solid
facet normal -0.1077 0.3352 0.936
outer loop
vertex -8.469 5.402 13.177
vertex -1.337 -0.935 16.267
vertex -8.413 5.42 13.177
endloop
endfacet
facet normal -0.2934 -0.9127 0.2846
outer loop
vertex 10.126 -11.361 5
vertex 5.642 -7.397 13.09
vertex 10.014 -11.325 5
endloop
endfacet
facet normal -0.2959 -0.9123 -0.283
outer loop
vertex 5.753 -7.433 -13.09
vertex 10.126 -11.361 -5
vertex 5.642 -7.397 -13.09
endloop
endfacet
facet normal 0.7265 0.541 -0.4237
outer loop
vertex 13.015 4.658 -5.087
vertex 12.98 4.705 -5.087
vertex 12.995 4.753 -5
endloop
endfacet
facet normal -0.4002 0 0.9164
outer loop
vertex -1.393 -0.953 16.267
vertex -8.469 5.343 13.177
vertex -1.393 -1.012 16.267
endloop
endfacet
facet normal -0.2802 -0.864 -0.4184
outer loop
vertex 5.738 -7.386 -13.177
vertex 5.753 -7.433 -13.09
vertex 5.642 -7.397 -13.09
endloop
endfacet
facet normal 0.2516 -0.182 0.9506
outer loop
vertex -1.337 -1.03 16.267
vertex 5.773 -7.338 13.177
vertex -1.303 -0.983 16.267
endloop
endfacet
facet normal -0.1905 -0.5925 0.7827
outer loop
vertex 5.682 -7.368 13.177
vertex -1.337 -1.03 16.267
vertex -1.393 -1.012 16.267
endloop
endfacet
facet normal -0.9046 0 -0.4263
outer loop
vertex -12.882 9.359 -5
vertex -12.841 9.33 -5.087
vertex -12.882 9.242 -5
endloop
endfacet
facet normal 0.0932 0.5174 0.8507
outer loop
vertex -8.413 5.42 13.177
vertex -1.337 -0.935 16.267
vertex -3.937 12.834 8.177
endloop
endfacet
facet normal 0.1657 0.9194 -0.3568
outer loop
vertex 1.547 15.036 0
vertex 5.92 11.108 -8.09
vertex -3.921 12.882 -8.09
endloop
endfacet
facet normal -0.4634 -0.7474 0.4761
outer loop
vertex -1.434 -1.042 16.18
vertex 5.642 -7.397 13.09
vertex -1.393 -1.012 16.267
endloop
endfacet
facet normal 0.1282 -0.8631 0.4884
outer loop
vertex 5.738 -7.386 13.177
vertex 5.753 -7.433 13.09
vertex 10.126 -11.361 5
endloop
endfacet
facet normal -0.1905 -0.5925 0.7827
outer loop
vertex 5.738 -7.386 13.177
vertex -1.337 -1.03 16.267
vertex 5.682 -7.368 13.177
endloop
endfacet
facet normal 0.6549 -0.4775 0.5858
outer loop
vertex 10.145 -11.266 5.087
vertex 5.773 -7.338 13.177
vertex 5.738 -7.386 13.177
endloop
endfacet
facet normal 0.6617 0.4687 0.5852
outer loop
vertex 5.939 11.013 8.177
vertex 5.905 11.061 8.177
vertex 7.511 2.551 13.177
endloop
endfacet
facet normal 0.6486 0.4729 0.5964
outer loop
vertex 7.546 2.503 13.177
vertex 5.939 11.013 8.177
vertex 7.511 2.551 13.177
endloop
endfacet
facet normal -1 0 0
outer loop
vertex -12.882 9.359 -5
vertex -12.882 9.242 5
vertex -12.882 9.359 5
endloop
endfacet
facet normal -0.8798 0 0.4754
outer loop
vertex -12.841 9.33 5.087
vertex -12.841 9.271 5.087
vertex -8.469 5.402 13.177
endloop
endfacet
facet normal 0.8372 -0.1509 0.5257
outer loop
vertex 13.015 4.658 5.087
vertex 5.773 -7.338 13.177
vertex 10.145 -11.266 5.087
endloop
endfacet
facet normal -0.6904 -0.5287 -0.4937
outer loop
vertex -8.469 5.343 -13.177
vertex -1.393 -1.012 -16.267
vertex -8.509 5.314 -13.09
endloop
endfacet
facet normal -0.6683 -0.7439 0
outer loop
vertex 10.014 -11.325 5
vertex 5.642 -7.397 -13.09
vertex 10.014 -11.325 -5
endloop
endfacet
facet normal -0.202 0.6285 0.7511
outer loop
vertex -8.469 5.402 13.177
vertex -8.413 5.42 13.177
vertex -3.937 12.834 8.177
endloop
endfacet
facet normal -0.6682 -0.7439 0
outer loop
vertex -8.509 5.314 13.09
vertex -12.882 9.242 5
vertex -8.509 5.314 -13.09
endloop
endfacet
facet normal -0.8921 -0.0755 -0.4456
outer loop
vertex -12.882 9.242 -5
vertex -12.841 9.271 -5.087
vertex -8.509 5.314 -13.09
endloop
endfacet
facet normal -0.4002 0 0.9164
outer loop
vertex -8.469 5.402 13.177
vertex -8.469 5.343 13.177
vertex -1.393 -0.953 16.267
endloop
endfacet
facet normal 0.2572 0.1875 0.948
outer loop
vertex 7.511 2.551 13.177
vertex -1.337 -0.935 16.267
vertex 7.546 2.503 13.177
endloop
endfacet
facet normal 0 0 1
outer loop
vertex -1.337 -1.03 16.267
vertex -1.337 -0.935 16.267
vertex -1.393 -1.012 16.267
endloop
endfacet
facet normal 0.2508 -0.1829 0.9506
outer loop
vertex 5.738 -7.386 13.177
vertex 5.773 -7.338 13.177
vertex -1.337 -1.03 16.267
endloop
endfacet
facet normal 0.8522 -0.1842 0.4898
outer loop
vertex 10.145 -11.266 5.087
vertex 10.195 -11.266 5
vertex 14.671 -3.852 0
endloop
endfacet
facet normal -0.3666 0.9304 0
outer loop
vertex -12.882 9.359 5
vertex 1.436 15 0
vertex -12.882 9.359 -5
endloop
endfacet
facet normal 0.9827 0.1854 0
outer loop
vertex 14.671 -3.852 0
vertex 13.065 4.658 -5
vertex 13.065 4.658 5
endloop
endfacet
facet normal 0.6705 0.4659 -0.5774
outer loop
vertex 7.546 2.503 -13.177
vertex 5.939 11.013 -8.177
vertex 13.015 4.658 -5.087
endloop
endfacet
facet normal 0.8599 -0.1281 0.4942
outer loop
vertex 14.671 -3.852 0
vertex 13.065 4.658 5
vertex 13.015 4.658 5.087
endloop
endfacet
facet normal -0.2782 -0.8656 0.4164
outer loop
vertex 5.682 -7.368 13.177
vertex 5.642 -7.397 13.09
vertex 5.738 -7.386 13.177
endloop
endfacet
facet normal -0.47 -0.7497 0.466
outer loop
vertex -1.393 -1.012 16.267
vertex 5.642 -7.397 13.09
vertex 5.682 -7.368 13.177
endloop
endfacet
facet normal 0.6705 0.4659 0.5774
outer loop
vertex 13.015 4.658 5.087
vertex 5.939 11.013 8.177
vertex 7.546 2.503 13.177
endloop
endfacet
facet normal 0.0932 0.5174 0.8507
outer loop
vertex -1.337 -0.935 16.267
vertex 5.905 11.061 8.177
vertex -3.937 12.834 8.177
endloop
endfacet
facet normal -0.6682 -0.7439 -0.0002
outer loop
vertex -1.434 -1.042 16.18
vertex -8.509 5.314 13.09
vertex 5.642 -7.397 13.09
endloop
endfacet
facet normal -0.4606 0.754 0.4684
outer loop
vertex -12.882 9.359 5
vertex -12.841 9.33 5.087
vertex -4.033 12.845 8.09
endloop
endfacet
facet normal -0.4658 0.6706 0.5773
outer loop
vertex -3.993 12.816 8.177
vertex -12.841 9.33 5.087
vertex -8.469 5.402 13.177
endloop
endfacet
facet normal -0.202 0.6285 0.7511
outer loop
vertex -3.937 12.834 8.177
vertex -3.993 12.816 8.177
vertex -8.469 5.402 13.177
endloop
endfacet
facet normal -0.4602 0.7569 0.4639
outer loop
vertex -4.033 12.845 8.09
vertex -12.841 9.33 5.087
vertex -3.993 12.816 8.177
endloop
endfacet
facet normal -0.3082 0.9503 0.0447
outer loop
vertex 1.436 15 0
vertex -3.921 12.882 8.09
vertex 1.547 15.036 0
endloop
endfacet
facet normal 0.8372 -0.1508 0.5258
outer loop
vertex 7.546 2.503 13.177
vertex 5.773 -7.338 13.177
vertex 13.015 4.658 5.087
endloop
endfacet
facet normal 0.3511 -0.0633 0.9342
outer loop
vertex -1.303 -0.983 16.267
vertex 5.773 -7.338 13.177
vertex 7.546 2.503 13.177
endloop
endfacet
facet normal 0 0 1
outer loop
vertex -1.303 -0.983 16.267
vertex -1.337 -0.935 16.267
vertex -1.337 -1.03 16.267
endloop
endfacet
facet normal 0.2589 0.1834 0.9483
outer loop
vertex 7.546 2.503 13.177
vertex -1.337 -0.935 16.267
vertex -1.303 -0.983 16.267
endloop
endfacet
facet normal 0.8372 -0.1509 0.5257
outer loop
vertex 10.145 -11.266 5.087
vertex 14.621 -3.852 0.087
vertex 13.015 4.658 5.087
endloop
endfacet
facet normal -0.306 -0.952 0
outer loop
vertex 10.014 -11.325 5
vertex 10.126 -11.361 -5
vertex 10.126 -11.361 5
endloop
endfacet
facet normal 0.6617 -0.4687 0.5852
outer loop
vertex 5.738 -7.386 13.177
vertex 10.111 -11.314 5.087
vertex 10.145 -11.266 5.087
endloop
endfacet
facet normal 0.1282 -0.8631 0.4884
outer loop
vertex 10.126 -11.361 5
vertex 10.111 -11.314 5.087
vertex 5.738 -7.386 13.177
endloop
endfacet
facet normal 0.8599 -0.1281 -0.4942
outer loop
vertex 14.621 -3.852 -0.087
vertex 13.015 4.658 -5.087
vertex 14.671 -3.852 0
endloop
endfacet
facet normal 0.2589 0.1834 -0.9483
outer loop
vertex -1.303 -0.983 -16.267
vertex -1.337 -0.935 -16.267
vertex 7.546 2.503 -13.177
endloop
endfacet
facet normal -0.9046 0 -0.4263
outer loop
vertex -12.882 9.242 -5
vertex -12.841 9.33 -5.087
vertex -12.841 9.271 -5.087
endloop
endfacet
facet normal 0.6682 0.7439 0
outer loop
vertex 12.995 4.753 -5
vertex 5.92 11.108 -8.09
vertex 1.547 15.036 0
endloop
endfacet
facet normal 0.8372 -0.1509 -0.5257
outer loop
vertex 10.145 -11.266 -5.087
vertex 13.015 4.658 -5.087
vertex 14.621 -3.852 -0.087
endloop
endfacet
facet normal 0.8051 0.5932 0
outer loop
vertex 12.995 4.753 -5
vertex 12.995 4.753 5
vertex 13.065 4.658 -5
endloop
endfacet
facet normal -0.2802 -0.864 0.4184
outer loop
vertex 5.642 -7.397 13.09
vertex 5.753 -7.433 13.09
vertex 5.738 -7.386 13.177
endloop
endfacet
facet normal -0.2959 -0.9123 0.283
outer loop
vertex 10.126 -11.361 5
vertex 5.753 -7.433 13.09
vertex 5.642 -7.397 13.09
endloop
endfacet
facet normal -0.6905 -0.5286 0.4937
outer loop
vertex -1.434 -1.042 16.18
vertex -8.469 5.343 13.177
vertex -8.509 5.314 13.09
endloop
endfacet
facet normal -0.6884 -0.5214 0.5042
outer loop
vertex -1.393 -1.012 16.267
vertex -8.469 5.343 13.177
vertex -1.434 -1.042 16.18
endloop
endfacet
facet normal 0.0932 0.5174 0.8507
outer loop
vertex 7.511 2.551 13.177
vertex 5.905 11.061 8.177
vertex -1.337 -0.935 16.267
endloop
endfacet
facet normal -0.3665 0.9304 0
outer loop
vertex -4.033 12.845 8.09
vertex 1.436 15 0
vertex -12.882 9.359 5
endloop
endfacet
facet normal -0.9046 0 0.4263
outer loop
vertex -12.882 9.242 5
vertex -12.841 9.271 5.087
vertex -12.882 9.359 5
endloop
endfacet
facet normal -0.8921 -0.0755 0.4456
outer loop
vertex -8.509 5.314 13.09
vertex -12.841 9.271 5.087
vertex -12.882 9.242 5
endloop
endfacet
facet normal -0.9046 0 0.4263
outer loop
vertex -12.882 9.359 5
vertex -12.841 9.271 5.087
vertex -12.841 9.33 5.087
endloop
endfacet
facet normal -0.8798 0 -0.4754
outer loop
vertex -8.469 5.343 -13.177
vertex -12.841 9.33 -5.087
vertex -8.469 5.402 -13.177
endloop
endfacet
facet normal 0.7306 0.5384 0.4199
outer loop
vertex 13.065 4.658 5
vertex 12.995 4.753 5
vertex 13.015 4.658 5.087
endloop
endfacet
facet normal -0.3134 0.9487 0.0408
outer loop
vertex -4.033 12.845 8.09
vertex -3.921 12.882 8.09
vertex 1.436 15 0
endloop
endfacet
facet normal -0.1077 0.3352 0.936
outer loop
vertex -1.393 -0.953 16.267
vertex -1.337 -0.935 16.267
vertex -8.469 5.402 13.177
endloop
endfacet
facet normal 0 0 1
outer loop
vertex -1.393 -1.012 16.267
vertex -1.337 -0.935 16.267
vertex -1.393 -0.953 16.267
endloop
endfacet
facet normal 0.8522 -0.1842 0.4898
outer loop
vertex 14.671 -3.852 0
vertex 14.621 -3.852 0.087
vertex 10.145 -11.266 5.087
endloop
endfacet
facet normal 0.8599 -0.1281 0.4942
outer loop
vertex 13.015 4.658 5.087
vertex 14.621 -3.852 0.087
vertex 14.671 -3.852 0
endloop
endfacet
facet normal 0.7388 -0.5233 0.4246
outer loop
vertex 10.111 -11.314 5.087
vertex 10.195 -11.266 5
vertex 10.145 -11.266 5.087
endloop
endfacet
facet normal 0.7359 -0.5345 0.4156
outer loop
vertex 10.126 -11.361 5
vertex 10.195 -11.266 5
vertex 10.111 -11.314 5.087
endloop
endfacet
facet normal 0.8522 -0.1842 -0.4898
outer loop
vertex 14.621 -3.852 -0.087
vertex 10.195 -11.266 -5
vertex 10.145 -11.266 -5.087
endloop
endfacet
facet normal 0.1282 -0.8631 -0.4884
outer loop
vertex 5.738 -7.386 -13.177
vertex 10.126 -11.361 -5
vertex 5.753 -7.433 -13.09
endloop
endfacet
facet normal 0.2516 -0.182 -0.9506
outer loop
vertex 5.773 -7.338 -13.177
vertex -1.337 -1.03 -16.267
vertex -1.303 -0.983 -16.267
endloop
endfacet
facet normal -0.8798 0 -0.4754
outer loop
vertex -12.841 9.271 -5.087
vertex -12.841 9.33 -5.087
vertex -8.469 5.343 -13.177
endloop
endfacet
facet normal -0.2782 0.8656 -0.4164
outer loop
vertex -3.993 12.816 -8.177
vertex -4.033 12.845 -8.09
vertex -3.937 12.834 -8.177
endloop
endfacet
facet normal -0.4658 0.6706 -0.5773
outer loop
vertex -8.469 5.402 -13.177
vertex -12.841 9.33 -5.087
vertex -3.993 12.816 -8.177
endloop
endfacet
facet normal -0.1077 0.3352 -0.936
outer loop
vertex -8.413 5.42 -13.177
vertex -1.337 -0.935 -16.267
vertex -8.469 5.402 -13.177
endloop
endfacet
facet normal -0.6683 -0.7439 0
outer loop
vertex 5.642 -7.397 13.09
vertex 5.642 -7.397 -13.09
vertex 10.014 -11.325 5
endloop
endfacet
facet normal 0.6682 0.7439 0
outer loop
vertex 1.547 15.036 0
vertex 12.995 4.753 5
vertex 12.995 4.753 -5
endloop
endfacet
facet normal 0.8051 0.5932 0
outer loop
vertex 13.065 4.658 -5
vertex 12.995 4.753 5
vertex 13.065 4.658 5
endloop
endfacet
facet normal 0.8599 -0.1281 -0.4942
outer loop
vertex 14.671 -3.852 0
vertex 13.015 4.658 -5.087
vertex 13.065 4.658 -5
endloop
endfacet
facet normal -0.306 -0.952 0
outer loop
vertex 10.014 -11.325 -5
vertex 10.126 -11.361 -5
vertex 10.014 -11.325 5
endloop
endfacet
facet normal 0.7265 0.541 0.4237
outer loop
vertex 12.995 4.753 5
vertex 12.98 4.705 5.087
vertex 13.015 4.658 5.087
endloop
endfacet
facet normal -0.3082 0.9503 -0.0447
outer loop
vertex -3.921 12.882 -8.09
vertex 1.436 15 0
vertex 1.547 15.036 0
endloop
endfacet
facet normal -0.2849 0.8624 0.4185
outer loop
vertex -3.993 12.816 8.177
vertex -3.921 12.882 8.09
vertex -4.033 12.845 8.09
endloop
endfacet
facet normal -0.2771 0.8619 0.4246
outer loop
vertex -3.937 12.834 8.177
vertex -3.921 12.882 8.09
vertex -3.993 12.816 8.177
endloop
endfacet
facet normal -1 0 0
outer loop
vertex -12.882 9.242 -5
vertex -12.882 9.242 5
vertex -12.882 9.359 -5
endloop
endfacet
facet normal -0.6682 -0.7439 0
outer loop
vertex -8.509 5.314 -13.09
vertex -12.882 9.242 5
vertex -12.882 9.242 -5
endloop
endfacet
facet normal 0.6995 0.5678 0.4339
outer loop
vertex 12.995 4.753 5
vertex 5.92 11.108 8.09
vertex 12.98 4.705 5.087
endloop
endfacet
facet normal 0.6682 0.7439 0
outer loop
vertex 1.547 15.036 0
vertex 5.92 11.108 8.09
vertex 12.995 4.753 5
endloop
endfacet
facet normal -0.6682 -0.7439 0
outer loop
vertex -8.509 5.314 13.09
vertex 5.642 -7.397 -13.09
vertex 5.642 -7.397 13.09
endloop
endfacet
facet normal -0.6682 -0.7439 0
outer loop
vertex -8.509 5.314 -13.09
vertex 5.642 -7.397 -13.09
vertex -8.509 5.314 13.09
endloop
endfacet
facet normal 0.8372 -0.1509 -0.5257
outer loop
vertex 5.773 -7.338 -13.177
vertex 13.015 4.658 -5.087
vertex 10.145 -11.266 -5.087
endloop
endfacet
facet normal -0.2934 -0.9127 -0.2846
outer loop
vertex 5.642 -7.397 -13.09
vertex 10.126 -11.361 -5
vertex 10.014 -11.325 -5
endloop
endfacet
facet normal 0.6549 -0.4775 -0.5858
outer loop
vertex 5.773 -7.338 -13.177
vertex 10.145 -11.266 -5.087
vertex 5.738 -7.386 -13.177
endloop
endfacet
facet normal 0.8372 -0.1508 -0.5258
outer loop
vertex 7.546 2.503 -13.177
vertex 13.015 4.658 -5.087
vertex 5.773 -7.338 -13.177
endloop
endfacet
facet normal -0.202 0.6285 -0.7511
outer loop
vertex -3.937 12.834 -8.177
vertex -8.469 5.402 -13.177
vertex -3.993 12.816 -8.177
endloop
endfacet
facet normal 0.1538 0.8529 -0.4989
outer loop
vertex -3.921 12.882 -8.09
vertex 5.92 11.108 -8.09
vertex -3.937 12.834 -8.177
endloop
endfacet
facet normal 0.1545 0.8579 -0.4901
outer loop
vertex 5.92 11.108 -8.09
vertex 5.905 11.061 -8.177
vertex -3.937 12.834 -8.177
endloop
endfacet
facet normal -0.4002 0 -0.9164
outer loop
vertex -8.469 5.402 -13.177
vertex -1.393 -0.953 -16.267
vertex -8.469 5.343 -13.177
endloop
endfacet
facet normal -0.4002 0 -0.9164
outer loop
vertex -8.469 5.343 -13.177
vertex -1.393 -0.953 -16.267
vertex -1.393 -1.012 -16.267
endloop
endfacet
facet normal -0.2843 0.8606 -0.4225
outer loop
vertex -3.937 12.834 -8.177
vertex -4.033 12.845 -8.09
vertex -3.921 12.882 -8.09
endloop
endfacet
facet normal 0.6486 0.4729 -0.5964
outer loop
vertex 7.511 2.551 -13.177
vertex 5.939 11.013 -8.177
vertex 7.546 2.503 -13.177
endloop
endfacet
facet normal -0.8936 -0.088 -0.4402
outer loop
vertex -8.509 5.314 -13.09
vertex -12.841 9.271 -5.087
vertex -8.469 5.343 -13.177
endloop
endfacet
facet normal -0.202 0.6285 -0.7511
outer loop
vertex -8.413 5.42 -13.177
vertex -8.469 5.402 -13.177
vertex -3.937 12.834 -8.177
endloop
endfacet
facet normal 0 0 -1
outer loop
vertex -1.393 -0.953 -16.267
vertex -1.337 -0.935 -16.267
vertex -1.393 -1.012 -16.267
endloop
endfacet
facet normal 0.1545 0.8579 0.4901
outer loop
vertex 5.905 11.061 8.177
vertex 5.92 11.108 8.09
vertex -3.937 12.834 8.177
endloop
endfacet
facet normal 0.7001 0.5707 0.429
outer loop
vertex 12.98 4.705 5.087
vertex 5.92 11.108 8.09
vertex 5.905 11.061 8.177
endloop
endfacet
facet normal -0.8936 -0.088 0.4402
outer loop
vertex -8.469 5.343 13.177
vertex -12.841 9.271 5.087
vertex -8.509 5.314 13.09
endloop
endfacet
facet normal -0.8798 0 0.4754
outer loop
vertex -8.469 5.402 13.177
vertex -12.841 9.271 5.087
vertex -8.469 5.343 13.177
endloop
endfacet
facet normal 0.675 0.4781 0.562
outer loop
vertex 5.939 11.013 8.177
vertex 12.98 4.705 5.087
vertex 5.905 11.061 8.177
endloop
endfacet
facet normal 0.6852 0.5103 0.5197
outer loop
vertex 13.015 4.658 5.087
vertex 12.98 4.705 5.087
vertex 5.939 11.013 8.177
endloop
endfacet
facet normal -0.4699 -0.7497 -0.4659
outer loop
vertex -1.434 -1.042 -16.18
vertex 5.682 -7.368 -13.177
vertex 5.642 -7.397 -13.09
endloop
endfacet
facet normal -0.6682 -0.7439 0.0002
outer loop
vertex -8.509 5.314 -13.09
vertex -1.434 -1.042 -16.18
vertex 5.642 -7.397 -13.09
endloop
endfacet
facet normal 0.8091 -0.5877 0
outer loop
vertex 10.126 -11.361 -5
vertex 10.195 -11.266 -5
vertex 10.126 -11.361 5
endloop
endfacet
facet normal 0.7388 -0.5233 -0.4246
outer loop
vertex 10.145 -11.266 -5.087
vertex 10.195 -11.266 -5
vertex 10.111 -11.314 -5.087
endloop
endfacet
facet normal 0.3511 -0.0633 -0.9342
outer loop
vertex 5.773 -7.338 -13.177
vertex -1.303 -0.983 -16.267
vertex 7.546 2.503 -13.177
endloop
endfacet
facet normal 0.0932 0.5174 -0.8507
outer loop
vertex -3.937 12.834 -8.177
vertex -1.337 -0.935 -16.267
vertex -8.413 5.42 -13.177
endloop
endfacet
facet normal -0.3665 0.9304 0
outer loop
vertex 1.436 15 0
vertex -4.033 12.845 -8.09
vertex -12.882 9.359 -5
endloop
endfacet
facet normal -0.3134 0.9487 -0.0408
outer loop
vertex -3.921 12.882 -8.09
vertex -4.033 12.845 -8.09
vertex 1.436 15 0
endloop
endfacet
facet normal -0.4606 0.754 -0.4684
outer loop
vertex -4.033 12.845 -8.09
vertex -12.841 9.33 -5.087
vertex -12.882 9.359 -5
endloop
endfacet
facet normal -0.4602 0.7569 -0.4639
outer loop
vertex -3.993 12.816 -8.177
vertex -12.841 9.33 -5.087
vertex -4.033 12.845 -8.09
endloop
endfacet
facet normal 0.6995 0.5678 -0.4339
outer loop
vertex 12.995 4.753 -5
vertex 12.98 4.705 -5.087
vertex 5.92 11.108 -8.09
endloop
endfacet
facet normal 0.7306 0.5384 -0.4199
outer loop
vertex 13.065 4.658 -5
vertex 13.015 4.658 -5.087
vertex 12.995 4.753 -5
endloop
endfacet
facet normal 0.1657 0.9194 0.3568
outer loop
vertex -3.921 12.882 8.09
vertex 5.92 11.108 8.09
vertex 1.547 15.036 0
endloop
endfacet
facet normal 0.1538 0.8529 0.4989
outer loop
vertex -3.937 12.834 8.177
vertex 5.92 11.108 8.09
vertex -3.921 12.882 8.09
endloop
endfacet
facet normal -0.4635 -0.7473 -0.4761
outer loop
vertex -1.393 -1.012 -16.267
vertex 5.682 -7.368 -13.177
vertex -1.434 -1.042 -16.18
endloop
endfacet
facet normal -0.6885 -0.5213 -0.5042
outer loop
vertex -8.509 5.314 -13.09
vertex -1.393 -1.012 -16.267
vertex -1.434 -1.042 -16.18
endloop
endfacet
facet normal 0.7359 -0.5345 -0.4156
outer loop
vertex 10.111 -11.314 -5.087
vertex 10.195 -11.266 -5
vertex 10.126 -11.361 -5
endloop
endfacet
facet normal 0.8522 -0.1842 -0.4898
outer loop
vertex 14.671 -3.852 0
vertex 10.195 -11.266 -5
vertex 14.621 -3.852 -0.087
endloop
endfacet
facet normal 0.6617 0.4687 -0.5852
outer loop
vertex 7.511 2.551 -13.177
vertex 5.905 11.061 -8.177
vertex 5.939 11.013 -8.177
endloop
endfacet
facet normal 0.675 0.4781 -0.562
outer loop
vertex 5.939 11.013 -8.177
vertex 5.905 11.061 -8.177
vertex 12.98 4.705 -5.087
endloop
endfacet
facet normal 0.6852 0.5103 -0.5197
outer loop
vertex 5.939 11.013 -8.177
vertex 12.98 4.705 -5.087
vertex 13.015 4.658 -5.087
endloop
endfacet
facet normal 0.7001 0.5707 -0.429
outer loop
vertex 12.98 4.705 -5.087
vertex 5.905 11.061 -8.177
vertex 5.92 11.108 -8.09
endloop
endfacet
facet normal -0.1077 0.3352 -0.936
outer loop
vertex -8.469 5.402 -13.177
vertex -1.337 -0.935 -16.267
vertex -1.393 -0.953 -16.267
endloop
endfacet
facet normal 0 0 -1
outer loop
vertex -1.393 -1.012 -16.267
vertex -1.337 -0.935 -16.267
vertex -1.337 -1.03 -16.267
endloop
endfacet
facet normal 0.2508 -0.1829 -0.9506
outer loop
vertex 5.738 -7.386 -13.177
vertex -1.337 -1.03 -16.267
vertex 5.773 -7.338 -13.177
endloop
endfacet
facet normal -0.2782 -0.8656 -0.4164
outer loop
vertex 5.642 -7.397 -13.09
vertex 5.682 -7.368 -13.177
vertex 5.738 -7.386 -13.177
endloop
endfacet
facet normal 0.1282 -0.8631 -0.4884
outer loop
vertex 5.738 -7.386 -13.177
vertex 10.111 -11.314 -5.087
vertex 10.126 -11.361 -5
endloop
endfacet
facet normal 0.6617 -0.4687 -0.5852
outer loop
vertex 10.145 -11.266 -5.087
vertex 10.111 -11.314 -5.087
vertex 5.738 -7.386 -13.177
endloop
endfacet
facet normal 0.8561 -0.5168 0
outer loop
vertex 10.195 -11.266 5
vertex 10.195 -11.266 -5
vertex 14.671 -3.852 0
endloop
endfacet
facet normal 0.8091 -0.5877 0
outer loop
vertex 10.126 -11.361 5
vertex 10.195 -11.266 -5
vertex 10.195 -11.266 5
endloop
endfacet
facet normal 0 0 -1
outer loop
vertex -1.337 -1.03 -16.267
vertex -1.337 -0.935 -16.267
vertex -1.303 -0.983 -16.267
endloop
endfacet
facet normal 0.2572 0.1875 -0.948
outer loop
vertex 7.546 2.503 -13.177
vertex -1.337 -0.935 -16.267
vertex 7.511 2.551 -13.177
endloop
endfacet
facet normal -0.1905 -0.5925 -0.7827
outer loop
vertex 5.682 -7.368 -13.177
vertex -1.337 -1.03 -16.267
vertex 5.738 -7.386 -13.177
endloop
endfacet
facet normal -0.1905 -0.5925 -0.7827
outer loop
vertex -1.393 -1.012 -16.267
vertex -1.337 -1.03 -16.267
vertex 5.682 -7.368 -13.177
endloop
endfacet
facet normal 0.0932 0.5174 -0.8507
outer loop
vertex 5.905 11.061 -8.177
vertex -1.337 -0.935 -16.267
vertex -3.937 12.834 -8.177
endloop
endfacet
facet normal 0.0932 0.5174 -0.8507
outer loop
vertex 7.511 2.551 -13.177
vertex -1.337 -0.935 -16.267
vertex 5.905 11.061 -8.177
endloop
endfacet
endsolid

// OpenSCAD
// Auto-generated OpenSCAD file

    inner_points = 10*[[-1.2800868421421776, 0.9300375234937233, -0.4999999999986175], [1.00952842451697, -1.126609720368595, 0.4999999999986175], [0.7495811565537936, 0.25032633822332373, -1.309016994373636], [0.5889249096677321, 1.1013196227617108, 0.8090169943779234], [-0.39522647677644196, 1.2786499601524015, -0.8090169943722536], [-1.2800868421428393, 0.930037523491642, 0.5000000000013824], [-0.8428092367899453, 0.5372528513524985, -1.309016994374093], [1.4571111845311355, -0.3852126115666106, 4.568012634820207e-13], [0.572250819164738, -0.7338250482273702, 1.309016994374093], [1.0095284245176321, -1.1266097203665137, -0.5000000000013824], [0.15164730431657092, 1.494104294906303, 3.5040581547463034e-12], [-0.3952264767775129, 1.2786499601490338, 0.8090169943776411], [1.2964549376461445, 0.46578067297514414, 0.5000000000021215], [0.7495811565520609, 0.25032633821787476, 1.3090169943762586], [0.5889249096688031, 1.1013196227650786, -0.8090169943719714], [-0.8428092367916781, 0.5372528513470497, 1.3090169943758017], [-0.13527920881153285, -0.09828609843406824, -1.6180339887498947], [1.2964549376468066, 0.4657806729772256, -0.49999999999787836], [-0.13527920881367453, -0.09828609844080341, 1.6180339887498947], [0.5722508191664707, -0.7338250482219214, -1.3090169943758017]];

    outer_points = 10*[[1.6180339861193813, 0.0, 9.226332282866825e-05], [-1.6180339861193813, 0.0, -9.226332282866825e-05], [4.8497926242127776e-05, 1.3764661599662604, -0.8505144895094868], [7.848867363894099e-05, -0.850514490892208, -1.3764661577284751], [1.3090654955439587, 0.4254096483352815, -0.8505340370787032], [1.3090169976177166, -0.9510565116309789, -1.9547569216365145e-05], [1.309016986875918, 0.9510565116309789, 0.00016883276146815448], [-1.308968488949676, 0.4254096483352815, -0.850683322270955], [-1.309016986875918, -0.9510565116309789, -0.00016883276146815448], [-1.3090169976177166, 0.9510565116309789, 1.9547569216365145e-05], [0.8090954784139313, -0.2627292414823533, -1.3763618133434734], [0.8090655050471297, -1.113432112705552, -0.8507149509023446], [-0.8089385077054501, -0.2627292414823533, -1.3764540766663023], [-0.8089684810722516, -1.113432112705552, -0.8508072142251732], [0.5000784791704679, 0.6883272701486257, -1.3762852439048336], [0.5000000078774243, -1.5388417610408336, -0.00012389195421817631], [0.49999999049682897, 1.5388417610408336, 0.00018091382364129736], [-0.4999215192037853, 0.6883272701486257, -1.3763422657742568], [-0.49999999049682897, -1.5388417610408336, -0.00018091382364129736], [-0.5000000078774243, 1.5388417610408336, 0.00012389195421817631]];

    // Convex hull for inner set (I)
    module inner_hull() {
        hull() {
            for (p = inner_points) {
                translate(p) sphere(r=0.1);
            }
        }
    }

    // Convex hull for outer set (O) minus inner hull (O \ I)
    module outer_minus_inner() {
        difference() {
            hull() {
                for (p = outer_points) {
                    translate(p) sphere(r=0.1);
                }
            }
            inner_hull(); // Subtract inner hull
        }
    }

    // Convex hull for outer set (O) minus all translated inner hulls
    module outer_minus_AllTranslationInner() {
        difference() {
            hull() {
                for (p = outer_points) {
                    translate(p) sphere(r=0.1);
                }
            }
            hull() {
                translate([0,0,50]) inner_hull();
                translate([0,0,-50]) inner_hull();
            }; // Subtract translated inner hulls
        }
    }

    // Difference between outer_minus_inner and outer_minus_AllTranslationInner
    module outer_minus_inner_diff() {
        difference() {
            // Outer minus inner
            difference() {
                hull() {
                    for (p = outer_points) {
                        translate(p) sphere(r=0.1);
                    }
                }
                inner_hull();
            }

            // Subtract Outer minus AllTranslationInner
            difference() {
                hull() {
                    for (p = outer_points) {
                        translate(p) sphere(r=0.1);
                    }
                }
                hull() {
                    translate([0,0,50]) inner_hull();
                    translate([0,0,-50]) inner_hull();
                };
            }
        }
    }

    // Rendering all with colors applied
    color([1, 0, 0, 0.5]) inner_hull(); // Transparent red
    
